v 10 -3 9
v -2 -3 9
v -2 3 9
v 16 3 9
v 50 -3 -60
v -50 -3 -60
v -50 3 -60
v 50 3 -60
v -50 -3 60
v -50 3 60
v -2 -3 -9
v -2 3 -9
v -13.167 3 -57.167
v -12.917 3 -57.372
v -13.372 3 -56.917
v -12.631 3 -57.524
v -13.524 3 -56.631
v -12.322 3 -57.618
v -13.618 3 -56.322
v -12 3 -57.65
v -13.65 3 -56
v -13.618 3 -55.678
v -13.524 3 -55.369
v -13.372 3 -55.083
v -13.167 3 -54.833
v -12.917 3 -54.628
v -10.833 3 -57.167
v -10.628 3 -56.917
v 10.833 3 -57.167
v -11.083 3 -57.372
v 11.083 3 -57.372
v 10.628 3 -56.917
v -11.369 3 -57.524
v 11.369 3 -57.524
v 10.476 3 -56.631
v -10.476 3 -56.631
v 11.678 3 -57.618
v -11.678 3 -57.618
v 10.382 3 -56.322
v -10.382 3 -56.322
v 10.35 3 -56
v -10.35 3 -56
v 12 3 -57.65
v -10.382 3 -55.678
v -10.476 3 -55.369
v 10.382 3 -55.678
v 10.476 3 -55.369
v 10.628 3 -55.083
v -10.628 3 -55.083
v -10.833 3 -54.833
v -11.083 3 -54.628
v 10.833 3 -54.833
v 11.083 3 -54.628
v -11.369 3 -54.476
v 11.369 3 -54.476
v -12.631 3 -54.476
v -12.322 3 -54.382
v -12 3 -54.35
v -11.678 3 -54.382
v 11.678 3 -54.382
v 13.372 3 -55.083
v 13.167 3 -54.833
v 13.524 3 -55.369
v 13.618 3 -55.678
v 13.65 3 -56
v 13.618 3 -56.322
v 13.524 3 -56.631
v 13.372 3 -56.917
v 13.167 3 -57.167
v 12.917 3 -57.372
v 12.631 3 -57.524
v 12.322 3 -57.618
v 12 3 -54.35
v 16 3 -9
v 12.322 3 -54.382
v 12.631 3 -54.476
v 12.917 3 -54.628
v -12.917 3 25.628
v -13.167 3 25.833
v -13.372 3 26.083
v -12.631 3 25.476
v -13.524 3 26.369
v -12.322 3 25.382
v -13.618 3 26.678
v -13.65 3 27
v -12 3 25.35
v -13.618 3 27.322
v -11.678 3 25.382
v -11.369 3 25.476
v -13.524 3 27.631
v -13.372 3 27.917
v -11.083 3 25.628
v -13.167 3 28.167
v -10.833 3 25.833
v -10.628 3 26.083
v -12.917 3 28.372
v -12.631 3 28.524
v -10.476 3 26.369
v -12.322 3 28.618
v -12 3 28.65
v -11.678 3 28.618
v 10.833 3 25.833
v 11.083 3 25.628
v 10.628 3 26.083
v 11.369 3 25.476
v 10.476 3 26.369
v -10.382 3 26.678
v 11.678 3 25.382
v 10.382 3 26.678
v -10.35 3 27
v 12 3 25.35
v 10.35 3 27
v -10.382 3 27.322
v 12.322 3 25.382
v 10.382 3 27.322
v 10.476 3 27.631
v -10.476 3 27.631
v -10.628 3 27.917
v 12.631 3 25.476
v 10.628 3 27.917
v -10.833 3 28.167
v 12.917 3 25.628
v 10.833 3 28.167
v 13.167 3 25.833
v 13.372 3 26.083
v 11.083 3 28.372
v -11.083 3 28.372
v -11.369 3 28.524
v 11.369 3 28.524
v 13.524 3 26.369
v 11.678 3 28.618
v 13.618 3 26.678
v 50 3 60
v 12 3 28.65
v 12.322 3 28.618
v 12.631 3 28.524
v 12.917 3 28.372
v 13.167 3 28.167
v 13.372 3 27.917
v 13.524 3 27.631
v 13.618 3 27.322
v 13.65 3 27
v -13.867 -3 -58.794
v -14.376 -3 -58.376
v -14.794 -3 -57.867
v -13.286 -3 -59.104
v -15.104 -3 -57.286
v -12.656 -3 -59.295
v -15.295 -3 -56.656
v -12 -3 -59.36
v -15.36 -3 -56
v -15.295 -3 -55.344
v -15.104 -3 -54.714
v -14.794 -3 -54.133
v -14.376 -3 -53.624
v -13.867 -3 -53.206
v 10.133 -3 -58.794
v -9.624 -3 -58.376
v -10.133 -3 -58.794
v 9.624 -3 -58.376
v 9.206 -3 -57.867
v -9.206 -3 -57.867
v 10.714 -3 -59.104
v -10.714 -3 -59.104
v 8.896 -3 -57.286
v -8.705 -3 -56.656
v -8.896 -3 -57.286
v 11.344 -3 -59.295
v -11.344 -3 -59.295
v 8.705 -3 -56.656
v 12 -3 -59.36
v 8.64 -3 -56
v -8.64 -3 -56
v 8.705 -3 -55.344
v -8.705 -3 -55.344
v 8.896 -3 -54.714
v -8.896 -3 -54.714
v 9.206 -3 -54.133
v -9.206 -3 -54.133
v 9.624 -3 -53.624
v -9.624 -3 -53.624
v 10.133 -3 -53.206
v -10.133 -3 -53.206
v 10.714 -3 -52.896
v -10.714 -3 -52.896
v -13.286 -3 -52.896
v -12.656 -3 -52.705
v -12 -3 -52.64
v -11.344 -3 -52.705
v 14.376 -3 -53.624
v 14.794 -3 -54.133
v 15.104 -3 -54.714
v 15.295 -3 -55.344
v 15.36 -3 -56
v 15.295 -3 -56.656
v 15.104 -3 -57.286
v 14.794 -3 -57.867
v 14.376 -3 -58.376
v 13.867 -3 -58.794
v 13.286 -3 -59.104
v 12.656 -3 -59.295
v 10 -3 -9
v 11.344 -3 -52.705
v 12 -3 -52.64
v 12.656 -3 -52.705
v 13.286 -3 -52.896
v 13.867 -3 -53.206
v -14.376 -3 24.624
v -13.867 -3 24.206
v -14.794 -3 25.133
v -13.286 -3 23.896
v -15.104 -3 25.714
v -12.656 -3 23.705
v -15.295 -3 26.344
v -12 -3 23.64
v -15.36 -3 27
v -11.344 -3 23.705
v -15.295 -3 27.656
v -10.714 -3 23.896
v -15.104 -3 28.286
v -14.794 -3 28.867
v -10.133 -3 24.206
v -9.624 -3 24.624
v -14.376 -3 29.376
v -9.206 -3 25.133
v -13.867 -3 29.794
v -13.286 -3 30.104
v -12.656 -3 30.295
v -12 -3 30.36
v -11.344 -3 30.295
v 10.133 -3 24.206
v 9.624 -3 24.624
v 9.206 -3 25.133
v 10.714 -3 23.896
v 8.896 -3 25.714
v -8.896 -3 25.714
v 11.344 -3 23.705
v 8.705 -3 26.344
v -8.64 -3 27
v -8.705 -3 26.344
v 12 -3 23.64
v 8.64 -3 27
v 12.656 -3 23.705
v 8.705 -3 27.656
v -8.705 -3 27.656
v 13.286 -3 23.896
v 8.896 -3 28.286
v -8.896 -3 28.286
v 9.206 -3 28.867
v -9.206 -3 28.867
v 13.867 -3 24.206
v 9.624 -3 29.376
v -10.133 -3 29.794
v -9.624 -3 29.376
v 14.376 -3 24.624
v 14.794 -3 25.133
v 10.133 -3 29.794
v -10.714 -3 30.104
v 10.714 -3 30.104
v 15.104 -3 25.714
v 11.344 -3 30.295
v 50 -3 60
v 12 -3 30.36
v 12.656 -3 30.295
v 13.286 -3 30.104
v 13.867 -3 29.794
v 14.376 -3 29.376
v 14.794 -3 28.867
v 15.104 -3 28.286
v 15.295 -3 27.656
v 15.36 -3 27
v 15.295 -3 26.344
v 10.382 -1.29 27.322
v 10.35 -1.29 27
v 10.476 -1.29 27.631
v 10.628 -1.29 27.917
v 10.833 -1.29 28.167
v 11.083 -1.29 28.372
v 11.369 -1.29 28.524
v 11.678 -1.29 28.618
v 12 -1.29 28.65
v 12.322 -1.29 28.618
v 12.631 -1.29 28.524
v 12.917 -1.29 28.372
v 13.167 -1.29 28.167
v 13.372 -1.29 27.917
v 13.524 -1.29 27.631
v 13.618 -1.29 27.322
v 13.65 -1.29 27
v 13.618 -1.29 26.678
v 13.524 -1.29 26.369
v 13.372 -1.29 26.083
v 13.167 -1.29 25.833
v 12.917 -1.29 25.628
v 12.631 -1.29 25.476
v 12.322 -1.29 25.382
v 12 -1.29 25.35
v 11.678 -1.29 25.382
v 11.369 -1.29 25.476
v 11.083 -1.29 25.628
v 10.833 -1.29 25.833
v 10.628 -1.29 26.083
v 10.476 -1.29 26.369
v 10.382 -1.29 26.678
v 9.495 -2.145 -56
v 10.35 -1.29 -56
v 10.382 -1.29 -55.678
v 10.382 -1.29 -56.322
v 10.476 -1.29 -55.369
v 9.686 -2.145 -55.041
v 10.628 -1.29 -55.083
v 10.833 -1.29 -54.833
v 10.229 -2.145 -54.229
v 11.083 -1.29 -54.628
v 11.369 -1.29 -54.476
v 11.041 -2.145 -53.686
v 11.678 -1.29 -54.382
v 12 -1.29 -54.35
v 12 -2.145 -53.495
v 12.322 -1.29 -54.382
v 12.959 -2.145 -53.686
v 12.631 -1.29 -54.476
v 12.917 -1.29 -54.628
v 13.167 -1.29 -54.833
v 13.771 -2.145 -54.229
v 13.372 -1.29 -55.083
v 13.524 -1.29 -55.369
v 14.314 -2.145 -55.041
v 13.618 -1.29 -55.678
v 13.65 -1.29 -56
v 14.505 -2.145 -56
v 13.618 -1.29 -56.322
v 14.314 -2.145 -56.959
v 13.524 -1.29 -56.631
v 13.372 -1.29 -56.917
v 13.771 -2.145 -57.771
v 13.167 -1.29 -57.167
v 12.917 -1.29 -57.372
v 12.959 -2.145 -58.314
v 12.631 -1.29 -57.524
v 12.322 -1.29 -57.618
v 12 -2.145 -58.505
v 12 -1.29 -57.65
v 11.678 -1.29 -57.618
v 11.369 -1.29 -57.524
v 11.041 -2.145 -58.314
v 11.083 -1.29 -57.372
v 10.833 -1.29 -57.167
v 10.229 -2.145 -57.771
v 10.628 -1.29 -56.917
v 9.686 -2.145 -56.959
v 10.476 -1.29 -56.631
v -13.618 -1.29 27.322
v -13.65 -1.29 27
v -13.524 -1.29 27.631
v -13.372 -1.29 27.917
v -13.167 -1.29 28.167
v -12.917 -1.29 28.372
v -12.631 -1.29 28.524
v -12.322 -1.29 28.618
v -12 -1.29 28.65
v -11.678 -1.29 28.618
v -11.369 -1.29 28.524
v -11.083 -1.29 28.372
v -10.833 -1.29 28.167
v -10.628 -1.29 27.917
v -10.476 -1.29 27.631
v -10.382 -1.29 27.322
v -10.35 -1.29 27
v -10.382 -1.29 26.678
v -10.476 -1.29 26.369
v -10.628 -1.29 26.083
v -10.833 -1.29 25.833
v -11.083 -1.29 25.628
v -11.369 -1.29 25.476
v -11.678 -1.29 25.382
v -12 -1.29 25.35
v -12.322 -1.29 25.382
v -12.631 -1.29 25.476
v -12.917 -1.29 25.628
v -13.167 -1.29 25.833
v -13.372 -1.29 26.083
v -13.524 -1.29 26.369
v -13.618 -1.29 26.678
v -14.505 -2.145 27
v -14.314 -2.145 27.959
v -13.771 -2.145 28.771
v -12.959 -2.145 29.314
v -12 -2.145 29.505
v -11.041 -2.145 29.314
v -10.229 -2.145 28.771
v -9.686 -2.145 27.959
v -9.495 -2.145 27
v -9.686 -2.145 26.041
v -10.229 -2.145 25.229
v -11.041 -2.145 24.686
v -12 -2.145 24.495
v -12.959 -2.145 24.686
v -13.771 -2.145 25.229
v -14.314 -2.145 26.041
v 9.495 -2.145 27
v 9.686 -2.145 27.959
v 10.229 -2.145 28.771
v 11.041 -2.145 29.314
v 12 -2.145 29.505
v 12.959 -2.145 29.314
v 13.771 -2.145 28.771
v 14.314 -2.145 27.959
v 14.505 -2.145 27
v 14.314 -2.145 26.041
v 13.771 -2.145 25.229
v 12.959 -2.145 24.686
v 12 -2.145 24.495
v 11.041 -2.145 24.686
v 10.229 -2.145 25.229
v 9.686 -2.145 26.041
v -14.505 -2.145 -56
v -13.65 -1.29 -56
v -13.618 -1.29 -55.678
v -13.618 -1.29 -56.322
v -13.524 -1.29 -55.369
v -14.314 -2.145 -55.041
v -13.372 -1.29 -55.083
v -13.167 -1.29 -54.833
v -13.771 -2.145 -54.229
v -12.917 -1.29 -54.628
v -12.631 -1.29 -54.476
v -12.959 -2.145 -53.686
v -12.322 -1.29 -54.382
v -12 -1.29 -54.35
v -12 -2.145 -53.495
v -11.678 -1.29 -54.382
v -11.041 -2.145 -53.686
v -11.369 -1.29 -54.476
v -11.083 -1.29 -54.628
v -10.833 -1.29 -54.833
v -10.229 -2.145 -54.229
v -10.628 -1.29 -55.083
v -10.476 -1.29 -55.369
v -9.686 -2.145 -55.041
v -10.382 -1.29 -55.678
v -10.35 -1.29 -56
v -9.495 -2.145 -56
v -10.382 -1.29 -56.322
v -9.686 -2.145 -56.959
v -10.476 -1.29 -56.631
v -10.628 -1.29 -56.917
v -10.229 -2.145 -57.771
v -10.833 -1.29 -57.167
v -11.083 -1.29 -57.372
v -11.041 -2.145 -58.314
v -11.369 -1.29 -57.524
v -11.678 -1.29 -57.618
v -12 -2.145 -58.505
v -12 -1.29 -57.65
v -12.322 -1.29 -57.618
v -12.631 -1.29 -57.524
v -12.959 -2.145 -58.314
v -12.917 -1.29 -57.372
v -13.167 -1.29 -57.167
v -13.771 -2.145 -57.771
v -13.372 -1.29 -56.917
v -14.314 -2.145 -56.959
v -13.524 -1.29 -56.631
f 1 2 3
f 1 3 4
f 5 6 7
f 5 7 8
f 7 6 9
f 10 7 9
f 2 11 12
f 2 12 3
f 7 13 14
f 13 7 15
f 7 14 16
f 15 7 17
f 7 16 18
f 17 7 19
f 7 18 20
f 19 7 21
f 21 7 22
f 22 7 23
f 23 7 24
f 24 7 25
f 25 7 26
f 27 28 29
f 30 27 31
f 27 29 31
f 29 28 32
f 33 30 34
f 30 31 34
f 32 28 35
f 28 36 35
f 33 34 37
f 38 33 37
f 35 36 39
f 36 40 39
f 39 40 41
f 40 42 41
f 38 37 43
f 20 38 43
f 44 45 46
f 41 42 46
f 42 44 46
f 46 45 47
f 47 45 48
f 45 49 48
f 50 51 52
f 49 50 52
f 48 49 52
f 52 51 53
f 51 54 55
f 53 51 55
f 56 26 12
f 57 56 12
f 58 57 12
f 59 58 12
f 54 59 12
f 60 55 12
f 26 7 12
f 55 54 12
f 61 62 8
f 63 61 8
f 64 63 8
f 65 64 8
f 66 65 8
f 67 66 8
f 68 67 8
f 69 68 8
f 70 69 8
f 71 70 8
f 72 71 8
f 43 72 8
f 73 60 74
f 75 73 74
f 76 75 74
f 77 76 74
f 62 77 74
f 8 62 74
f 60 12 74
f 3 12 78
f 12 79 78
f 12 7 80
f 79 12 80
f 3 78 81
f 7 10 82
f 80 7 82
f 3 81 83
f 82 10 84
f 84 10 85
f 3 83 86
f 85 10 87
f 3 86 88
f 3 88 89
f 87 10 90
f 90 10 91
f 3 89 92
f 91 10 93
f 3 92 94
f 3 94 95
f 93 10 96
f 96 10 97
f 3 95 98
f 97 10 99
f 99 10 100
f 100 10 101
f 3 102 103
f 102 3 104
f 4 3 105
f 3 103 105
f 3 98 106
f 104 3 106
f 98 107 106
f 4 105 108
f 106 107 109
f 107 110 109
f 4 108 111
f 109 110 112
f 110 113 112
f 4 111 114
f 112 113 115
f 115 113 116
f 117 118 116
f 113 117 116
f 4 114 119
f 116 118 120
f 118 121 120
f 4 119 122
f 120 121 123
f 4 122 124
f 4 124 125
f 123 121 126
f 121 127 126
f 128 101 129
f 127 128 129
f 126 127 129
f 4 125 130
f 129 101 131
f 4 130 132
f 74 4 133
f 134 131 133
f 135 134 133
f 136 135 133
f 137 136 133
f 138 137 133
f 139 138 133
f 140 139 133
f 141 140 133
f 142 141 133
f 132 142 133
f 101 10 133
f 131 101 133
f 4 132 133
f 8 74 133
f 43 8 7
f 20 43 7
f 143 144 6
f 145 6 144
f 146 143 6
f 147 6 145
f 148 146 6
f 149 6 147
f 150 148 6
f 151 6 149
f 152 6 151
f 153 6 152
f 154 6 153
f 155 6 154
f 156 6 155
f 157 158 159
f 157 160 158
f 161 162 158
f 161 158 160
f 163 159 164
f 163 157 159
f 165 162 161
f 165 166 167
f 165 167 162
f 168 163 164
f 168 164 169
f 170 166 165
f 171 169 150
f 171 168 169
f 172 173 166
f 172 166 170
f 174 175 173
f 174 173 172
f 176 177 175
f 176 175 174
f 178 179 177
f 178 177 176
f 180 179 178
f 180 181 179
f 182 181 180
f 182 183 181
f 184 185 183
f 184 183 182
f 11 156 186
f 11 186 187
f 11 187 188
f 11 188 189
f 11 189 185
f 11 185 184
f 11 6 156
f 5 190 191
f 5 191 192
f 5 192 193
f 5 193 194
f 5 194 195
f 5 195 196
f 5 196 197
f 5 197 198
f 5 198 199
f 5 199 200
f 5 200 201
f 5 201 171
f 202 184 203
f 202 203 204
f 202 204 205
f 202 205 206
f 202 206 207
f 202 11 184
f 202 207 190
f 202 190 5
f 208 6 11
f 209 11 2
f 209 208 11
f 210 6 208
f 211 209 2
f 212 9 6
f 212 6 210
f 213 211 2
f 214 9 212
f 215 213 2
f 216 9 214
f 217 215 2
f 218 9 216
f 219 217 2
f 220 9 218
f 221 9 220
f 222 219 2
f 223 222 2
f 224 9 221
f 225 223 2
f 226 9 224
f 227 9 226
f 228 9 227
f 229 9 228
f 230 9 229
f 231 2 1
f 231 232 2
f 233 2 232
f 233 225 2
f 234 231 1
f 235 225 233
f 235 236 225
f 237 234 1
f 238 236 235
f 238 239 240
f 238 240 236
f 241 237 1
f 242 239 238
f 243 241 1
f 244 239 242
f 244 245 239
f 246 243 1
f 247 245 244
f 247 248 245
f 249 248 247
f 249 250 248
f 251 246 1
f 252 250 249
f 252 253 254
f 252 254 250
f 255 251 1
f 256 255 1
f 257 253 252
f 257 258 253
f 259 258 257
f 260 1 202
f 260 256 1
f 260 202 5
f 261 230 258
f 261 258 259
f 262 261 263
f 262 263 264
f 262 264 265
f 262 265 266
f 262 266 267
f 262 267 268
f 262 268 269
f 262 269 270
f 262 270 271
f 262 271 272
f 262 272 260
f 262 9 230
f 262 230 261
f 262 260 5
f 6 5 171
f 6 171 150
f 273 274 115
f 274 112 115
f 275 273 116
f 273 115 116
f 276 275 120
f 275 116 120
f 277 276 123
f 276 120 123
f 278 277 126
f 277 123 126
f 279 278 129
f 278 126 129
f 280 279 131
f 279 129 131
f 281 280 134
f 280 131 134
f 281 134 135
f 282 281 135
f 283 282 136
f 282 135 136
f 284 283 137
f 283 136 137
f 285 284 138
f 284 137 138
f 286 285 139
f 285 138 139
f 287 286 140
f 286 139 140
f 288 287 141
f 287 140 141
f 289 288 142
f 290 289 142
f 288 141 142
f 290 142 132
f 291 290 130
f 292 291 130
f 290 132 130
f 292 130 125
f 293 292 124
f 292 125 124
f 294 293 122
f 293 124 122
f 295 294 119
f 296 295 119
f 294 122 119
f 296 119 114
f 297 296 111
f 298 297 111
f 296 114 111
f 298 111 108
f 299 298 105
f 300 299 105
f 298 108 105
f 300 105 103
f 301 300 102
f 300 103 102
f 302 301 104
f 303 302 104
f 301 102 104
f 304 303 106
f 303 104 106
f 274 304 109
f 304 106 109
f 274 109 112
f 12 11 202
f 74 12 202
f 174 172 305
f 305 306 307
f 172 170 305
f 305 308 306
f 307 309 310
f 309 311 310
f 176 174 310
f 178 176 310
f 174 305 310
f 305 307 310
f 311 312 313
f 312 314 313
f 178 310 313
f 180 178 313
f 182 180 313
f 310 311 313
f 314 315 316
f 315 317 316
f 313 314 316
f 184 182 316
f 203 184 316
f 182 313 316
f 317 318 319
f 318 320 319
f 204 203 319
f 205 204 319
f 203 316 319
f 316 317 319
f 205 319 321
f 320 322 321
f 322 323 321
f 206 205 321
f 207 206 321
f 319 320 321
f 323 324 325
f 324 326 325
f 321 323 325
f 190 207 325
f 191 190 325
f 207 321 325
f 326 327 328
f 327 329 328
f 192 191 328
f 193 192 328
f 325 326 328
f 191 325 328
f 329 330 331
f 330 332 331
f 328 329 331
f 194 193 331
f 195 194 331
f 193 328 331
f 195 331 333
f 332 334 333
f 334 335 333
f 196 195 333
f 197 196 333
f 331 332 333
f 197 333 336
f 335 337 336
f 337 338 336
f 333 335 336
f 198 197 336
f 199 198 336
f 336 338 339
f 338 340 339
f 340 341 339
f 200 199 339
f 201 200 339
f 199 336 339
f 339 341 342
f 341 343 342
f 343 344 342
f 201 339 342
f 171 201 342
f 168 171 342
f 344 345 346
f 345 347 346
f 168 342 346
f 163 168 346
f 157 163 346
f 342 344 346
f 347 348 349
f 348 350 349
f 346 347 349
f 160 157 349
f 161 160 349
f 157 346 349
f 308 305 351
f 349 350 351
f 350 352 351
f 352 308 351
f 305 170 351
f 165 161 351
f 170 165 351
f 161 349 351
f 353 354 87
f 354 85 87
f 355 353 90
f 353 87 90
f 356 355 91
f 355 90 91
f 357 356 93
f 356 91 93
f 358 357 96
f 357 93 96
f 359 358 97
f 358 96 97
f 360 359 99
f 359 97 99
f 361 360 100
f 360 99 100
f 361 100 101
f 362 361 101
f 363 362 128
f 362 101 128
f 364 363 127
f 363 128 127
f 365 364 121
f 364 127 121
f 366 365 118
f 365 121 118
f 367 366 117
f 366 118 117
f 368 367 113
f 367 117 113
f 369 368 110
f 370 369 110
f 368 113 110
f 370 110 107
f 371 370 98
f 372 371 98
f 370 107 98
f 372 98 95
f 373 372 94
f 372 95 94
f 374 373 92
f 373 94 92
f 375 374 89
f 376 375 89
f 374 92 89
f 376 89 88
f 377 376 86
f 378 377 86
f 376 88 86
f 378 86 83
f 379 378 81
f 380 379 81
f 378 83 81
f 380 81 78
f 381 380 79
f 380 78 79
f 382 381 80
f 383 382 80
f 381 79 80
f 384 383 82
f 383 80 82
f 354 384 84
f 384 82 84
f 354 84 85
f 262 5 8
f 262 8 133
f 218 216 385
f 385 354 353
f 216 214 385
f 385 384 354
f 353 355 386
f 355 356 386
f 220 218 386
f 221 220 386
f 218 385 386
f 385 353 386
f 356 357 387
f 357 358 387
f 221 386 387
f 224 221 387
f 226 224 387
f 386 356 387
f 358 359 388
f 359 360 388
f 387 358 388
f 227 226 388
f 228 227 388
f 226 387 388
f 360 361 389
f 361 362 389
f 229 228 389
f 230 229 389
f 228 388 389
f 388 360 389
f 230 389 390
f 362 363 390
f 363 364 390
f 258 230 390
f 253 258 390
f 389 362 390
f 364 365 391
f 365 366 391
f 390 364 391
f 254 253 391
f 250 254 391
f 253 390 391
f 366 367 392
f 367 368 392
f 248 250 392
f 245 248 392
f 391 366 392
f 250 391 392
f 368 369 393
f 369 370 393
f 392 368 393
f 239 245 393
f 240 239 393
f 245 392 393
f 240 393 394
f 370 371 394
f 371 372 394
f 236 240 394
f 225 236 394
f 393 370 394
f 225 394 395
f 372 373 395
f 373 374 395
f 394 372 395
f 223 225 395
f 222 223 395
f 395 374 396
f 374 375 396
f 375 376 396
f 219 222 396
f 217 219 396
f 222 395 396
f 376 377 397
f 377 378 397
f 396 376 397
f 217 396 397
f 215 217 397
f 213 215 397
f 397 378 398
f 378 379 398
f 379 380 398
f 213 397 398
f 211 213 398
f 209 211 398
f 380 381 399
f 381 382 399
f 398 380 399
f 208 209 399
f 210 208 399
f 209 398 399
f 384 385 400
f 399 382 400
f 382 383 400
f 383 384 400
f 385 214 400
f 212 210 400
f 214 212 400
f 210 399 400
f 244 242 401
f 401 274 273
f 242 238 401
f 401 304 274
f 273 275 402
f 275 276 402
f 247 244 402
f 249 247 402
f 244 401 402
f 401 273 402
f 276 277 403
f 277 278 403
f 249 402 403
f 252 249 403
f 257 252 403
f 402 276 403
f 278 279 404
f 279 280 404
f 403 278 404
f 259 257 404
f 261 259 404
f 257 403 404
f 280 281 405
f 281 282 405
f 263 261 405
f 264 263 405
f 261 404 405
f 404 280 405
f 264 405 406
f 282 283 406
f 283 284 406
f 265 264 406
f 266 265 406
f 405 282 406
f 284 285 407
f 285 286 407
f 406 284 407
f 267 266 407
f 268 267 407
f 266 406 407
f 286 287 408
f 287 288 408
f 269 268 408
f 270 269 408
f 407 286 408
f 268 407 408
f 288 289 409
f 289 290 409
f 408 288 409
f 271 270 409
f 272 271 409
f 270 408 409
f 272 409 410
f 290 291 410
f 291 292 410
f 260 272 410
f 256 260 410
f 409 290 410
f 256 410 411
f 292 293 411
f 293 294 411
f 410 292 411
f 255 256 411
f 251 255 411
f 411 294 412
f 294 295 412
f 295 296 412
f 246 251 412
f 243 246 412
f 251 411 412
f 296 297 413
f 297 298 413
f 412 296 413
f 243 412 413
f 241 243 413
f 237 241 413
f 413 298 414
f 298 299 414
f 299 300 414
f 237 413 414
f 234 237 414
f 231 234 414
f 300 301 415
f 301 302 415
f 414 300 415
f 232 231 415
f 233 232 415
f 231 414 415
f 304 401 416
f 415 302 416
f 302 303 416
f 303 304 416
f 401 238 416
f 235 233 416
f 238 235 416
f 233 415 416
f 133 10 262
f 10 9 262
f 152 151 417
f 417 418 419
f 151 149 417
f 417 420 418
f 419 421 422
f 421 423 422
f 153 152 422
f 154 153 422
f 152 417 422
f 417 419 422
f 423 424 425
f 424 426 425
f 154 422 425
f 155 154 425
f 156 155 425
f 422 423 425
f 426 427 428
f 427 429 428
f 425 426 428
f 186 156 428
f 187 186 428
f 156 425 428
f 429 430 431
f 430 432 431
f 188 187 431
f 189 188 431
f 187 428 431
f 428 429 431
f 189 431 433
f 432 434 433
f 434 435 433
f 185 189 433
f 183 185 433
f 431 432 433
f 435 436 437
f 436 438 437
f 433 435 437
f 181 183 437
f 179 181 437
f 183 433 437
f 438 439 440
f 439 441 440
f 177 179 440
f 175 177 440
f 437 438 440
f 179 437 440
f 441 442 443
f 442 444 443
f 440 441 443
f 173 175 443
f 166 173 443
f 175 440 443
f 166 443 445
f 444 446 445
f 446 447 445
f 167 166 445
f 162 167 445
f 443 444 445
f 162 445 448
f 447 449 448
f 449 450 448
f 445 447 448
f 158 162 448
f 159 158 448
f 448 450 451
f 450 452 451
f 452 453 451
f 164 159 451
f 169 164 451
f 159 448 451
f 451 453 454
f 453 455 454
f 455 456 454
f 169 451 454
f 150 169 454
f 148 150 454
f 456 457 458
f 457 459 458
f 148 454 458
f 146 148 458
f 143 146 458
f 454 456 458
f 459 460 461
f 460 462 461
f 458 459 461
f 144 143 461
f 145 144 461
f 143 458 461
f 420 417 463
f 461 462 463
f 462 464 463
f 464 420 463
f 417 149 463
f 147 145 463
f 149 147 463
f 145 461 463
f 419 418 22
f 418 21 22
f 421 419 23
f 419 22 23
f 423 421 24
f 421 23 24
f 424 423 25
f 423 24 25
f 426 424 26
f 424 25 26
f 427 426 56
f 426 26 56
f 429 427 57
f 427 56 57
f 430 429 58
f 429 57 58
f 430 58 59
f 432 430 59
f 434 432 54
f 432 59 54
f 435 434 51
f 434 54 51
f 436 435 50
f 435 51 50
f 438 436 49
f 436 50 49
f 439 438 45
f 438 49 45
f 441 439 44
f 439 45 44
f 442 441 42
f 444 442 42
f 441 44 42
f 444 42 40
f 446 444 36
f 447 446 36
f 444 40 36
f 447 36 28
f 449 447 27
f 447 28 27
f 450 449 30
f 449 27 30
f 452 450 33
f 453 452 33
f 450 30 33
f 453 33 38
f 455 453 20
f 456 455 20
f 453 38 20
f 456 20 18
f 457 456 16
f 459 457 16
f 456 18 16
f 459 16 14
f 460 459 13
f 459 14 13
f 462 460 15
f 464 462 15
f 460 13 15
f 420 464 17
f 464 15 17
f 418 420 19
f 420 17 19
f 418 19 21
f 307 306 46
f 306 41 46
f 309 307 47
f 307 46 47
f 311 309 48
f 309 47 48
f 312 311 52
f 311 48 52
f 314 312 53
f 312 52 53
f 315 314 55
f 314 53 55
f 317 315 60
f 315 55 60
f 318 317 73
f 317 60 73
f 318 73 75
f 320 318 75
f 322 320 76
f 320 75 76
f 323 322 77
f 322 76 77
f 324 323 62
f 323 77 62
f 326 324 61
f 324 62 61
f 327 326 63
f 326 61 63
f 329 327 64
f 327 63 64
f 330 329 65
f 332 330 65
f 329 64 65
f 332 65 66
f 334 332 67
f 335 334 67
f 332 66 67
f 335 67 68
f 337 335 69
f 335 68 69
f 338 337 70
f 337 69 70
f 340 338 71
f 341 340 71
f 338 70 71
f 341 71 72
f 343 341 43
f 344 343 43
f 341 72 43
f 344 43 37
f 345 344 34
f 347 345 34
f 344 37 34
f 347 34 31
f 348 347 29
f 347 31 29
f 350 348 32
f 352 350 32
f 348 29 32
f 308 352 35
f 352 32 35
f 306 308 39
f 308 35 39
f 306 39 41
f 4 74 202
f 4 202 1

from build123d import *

# Parameters (mm, degrees)
F0_W           = 100
F0_H           = 120
F0_W_2         = 12
F0_H_2         = 18
F1_DEPTH       = 3
F2_SIZE        = 5.99999
F4_D           = 3.3
F4_CSINK_D     = 6.72
F4_CSINK_ANGLE = 90


# Not quite as in the source:
# - a fillet or chamfer is up to 0.001 mm smaller than in the source, because OpenCascade refuses the exact size


with BuildPart() as f1:
    # F0 (on Front) → F1 (new body, symmetric)
    with BuildSketch(Plane.XZ):
        Rectangle(F0_W, F0_H)
        with Locations((4, 0)):
            Rectangle(F0_W_2, F0_H_2, mode=Mode.SUBTRACT)
    extrude(amount=F1_DEPTH, both=True)

    # F2 (size 6 in the source; OpenCascade refuses exactly that, so slightly less here)
    f2_edges = [f1.edges().sort_by_distance(p)[0] for p in [
        (10, 3, 0),
    ]]
    chamfer(f2_edges, length=F2_SIZE)

    # F4 (through all)
    with Locations(Plane.XZ.offset(3)):
        with Locations((-12, 27), (12, 27), (12, -56), (-12, -56)):
            CounterSinkHole(F4_D / 2, F4_CSINK_D / 2, counter_sink_angle=F4_CSINK_ANGLE)


solid = f1.part
